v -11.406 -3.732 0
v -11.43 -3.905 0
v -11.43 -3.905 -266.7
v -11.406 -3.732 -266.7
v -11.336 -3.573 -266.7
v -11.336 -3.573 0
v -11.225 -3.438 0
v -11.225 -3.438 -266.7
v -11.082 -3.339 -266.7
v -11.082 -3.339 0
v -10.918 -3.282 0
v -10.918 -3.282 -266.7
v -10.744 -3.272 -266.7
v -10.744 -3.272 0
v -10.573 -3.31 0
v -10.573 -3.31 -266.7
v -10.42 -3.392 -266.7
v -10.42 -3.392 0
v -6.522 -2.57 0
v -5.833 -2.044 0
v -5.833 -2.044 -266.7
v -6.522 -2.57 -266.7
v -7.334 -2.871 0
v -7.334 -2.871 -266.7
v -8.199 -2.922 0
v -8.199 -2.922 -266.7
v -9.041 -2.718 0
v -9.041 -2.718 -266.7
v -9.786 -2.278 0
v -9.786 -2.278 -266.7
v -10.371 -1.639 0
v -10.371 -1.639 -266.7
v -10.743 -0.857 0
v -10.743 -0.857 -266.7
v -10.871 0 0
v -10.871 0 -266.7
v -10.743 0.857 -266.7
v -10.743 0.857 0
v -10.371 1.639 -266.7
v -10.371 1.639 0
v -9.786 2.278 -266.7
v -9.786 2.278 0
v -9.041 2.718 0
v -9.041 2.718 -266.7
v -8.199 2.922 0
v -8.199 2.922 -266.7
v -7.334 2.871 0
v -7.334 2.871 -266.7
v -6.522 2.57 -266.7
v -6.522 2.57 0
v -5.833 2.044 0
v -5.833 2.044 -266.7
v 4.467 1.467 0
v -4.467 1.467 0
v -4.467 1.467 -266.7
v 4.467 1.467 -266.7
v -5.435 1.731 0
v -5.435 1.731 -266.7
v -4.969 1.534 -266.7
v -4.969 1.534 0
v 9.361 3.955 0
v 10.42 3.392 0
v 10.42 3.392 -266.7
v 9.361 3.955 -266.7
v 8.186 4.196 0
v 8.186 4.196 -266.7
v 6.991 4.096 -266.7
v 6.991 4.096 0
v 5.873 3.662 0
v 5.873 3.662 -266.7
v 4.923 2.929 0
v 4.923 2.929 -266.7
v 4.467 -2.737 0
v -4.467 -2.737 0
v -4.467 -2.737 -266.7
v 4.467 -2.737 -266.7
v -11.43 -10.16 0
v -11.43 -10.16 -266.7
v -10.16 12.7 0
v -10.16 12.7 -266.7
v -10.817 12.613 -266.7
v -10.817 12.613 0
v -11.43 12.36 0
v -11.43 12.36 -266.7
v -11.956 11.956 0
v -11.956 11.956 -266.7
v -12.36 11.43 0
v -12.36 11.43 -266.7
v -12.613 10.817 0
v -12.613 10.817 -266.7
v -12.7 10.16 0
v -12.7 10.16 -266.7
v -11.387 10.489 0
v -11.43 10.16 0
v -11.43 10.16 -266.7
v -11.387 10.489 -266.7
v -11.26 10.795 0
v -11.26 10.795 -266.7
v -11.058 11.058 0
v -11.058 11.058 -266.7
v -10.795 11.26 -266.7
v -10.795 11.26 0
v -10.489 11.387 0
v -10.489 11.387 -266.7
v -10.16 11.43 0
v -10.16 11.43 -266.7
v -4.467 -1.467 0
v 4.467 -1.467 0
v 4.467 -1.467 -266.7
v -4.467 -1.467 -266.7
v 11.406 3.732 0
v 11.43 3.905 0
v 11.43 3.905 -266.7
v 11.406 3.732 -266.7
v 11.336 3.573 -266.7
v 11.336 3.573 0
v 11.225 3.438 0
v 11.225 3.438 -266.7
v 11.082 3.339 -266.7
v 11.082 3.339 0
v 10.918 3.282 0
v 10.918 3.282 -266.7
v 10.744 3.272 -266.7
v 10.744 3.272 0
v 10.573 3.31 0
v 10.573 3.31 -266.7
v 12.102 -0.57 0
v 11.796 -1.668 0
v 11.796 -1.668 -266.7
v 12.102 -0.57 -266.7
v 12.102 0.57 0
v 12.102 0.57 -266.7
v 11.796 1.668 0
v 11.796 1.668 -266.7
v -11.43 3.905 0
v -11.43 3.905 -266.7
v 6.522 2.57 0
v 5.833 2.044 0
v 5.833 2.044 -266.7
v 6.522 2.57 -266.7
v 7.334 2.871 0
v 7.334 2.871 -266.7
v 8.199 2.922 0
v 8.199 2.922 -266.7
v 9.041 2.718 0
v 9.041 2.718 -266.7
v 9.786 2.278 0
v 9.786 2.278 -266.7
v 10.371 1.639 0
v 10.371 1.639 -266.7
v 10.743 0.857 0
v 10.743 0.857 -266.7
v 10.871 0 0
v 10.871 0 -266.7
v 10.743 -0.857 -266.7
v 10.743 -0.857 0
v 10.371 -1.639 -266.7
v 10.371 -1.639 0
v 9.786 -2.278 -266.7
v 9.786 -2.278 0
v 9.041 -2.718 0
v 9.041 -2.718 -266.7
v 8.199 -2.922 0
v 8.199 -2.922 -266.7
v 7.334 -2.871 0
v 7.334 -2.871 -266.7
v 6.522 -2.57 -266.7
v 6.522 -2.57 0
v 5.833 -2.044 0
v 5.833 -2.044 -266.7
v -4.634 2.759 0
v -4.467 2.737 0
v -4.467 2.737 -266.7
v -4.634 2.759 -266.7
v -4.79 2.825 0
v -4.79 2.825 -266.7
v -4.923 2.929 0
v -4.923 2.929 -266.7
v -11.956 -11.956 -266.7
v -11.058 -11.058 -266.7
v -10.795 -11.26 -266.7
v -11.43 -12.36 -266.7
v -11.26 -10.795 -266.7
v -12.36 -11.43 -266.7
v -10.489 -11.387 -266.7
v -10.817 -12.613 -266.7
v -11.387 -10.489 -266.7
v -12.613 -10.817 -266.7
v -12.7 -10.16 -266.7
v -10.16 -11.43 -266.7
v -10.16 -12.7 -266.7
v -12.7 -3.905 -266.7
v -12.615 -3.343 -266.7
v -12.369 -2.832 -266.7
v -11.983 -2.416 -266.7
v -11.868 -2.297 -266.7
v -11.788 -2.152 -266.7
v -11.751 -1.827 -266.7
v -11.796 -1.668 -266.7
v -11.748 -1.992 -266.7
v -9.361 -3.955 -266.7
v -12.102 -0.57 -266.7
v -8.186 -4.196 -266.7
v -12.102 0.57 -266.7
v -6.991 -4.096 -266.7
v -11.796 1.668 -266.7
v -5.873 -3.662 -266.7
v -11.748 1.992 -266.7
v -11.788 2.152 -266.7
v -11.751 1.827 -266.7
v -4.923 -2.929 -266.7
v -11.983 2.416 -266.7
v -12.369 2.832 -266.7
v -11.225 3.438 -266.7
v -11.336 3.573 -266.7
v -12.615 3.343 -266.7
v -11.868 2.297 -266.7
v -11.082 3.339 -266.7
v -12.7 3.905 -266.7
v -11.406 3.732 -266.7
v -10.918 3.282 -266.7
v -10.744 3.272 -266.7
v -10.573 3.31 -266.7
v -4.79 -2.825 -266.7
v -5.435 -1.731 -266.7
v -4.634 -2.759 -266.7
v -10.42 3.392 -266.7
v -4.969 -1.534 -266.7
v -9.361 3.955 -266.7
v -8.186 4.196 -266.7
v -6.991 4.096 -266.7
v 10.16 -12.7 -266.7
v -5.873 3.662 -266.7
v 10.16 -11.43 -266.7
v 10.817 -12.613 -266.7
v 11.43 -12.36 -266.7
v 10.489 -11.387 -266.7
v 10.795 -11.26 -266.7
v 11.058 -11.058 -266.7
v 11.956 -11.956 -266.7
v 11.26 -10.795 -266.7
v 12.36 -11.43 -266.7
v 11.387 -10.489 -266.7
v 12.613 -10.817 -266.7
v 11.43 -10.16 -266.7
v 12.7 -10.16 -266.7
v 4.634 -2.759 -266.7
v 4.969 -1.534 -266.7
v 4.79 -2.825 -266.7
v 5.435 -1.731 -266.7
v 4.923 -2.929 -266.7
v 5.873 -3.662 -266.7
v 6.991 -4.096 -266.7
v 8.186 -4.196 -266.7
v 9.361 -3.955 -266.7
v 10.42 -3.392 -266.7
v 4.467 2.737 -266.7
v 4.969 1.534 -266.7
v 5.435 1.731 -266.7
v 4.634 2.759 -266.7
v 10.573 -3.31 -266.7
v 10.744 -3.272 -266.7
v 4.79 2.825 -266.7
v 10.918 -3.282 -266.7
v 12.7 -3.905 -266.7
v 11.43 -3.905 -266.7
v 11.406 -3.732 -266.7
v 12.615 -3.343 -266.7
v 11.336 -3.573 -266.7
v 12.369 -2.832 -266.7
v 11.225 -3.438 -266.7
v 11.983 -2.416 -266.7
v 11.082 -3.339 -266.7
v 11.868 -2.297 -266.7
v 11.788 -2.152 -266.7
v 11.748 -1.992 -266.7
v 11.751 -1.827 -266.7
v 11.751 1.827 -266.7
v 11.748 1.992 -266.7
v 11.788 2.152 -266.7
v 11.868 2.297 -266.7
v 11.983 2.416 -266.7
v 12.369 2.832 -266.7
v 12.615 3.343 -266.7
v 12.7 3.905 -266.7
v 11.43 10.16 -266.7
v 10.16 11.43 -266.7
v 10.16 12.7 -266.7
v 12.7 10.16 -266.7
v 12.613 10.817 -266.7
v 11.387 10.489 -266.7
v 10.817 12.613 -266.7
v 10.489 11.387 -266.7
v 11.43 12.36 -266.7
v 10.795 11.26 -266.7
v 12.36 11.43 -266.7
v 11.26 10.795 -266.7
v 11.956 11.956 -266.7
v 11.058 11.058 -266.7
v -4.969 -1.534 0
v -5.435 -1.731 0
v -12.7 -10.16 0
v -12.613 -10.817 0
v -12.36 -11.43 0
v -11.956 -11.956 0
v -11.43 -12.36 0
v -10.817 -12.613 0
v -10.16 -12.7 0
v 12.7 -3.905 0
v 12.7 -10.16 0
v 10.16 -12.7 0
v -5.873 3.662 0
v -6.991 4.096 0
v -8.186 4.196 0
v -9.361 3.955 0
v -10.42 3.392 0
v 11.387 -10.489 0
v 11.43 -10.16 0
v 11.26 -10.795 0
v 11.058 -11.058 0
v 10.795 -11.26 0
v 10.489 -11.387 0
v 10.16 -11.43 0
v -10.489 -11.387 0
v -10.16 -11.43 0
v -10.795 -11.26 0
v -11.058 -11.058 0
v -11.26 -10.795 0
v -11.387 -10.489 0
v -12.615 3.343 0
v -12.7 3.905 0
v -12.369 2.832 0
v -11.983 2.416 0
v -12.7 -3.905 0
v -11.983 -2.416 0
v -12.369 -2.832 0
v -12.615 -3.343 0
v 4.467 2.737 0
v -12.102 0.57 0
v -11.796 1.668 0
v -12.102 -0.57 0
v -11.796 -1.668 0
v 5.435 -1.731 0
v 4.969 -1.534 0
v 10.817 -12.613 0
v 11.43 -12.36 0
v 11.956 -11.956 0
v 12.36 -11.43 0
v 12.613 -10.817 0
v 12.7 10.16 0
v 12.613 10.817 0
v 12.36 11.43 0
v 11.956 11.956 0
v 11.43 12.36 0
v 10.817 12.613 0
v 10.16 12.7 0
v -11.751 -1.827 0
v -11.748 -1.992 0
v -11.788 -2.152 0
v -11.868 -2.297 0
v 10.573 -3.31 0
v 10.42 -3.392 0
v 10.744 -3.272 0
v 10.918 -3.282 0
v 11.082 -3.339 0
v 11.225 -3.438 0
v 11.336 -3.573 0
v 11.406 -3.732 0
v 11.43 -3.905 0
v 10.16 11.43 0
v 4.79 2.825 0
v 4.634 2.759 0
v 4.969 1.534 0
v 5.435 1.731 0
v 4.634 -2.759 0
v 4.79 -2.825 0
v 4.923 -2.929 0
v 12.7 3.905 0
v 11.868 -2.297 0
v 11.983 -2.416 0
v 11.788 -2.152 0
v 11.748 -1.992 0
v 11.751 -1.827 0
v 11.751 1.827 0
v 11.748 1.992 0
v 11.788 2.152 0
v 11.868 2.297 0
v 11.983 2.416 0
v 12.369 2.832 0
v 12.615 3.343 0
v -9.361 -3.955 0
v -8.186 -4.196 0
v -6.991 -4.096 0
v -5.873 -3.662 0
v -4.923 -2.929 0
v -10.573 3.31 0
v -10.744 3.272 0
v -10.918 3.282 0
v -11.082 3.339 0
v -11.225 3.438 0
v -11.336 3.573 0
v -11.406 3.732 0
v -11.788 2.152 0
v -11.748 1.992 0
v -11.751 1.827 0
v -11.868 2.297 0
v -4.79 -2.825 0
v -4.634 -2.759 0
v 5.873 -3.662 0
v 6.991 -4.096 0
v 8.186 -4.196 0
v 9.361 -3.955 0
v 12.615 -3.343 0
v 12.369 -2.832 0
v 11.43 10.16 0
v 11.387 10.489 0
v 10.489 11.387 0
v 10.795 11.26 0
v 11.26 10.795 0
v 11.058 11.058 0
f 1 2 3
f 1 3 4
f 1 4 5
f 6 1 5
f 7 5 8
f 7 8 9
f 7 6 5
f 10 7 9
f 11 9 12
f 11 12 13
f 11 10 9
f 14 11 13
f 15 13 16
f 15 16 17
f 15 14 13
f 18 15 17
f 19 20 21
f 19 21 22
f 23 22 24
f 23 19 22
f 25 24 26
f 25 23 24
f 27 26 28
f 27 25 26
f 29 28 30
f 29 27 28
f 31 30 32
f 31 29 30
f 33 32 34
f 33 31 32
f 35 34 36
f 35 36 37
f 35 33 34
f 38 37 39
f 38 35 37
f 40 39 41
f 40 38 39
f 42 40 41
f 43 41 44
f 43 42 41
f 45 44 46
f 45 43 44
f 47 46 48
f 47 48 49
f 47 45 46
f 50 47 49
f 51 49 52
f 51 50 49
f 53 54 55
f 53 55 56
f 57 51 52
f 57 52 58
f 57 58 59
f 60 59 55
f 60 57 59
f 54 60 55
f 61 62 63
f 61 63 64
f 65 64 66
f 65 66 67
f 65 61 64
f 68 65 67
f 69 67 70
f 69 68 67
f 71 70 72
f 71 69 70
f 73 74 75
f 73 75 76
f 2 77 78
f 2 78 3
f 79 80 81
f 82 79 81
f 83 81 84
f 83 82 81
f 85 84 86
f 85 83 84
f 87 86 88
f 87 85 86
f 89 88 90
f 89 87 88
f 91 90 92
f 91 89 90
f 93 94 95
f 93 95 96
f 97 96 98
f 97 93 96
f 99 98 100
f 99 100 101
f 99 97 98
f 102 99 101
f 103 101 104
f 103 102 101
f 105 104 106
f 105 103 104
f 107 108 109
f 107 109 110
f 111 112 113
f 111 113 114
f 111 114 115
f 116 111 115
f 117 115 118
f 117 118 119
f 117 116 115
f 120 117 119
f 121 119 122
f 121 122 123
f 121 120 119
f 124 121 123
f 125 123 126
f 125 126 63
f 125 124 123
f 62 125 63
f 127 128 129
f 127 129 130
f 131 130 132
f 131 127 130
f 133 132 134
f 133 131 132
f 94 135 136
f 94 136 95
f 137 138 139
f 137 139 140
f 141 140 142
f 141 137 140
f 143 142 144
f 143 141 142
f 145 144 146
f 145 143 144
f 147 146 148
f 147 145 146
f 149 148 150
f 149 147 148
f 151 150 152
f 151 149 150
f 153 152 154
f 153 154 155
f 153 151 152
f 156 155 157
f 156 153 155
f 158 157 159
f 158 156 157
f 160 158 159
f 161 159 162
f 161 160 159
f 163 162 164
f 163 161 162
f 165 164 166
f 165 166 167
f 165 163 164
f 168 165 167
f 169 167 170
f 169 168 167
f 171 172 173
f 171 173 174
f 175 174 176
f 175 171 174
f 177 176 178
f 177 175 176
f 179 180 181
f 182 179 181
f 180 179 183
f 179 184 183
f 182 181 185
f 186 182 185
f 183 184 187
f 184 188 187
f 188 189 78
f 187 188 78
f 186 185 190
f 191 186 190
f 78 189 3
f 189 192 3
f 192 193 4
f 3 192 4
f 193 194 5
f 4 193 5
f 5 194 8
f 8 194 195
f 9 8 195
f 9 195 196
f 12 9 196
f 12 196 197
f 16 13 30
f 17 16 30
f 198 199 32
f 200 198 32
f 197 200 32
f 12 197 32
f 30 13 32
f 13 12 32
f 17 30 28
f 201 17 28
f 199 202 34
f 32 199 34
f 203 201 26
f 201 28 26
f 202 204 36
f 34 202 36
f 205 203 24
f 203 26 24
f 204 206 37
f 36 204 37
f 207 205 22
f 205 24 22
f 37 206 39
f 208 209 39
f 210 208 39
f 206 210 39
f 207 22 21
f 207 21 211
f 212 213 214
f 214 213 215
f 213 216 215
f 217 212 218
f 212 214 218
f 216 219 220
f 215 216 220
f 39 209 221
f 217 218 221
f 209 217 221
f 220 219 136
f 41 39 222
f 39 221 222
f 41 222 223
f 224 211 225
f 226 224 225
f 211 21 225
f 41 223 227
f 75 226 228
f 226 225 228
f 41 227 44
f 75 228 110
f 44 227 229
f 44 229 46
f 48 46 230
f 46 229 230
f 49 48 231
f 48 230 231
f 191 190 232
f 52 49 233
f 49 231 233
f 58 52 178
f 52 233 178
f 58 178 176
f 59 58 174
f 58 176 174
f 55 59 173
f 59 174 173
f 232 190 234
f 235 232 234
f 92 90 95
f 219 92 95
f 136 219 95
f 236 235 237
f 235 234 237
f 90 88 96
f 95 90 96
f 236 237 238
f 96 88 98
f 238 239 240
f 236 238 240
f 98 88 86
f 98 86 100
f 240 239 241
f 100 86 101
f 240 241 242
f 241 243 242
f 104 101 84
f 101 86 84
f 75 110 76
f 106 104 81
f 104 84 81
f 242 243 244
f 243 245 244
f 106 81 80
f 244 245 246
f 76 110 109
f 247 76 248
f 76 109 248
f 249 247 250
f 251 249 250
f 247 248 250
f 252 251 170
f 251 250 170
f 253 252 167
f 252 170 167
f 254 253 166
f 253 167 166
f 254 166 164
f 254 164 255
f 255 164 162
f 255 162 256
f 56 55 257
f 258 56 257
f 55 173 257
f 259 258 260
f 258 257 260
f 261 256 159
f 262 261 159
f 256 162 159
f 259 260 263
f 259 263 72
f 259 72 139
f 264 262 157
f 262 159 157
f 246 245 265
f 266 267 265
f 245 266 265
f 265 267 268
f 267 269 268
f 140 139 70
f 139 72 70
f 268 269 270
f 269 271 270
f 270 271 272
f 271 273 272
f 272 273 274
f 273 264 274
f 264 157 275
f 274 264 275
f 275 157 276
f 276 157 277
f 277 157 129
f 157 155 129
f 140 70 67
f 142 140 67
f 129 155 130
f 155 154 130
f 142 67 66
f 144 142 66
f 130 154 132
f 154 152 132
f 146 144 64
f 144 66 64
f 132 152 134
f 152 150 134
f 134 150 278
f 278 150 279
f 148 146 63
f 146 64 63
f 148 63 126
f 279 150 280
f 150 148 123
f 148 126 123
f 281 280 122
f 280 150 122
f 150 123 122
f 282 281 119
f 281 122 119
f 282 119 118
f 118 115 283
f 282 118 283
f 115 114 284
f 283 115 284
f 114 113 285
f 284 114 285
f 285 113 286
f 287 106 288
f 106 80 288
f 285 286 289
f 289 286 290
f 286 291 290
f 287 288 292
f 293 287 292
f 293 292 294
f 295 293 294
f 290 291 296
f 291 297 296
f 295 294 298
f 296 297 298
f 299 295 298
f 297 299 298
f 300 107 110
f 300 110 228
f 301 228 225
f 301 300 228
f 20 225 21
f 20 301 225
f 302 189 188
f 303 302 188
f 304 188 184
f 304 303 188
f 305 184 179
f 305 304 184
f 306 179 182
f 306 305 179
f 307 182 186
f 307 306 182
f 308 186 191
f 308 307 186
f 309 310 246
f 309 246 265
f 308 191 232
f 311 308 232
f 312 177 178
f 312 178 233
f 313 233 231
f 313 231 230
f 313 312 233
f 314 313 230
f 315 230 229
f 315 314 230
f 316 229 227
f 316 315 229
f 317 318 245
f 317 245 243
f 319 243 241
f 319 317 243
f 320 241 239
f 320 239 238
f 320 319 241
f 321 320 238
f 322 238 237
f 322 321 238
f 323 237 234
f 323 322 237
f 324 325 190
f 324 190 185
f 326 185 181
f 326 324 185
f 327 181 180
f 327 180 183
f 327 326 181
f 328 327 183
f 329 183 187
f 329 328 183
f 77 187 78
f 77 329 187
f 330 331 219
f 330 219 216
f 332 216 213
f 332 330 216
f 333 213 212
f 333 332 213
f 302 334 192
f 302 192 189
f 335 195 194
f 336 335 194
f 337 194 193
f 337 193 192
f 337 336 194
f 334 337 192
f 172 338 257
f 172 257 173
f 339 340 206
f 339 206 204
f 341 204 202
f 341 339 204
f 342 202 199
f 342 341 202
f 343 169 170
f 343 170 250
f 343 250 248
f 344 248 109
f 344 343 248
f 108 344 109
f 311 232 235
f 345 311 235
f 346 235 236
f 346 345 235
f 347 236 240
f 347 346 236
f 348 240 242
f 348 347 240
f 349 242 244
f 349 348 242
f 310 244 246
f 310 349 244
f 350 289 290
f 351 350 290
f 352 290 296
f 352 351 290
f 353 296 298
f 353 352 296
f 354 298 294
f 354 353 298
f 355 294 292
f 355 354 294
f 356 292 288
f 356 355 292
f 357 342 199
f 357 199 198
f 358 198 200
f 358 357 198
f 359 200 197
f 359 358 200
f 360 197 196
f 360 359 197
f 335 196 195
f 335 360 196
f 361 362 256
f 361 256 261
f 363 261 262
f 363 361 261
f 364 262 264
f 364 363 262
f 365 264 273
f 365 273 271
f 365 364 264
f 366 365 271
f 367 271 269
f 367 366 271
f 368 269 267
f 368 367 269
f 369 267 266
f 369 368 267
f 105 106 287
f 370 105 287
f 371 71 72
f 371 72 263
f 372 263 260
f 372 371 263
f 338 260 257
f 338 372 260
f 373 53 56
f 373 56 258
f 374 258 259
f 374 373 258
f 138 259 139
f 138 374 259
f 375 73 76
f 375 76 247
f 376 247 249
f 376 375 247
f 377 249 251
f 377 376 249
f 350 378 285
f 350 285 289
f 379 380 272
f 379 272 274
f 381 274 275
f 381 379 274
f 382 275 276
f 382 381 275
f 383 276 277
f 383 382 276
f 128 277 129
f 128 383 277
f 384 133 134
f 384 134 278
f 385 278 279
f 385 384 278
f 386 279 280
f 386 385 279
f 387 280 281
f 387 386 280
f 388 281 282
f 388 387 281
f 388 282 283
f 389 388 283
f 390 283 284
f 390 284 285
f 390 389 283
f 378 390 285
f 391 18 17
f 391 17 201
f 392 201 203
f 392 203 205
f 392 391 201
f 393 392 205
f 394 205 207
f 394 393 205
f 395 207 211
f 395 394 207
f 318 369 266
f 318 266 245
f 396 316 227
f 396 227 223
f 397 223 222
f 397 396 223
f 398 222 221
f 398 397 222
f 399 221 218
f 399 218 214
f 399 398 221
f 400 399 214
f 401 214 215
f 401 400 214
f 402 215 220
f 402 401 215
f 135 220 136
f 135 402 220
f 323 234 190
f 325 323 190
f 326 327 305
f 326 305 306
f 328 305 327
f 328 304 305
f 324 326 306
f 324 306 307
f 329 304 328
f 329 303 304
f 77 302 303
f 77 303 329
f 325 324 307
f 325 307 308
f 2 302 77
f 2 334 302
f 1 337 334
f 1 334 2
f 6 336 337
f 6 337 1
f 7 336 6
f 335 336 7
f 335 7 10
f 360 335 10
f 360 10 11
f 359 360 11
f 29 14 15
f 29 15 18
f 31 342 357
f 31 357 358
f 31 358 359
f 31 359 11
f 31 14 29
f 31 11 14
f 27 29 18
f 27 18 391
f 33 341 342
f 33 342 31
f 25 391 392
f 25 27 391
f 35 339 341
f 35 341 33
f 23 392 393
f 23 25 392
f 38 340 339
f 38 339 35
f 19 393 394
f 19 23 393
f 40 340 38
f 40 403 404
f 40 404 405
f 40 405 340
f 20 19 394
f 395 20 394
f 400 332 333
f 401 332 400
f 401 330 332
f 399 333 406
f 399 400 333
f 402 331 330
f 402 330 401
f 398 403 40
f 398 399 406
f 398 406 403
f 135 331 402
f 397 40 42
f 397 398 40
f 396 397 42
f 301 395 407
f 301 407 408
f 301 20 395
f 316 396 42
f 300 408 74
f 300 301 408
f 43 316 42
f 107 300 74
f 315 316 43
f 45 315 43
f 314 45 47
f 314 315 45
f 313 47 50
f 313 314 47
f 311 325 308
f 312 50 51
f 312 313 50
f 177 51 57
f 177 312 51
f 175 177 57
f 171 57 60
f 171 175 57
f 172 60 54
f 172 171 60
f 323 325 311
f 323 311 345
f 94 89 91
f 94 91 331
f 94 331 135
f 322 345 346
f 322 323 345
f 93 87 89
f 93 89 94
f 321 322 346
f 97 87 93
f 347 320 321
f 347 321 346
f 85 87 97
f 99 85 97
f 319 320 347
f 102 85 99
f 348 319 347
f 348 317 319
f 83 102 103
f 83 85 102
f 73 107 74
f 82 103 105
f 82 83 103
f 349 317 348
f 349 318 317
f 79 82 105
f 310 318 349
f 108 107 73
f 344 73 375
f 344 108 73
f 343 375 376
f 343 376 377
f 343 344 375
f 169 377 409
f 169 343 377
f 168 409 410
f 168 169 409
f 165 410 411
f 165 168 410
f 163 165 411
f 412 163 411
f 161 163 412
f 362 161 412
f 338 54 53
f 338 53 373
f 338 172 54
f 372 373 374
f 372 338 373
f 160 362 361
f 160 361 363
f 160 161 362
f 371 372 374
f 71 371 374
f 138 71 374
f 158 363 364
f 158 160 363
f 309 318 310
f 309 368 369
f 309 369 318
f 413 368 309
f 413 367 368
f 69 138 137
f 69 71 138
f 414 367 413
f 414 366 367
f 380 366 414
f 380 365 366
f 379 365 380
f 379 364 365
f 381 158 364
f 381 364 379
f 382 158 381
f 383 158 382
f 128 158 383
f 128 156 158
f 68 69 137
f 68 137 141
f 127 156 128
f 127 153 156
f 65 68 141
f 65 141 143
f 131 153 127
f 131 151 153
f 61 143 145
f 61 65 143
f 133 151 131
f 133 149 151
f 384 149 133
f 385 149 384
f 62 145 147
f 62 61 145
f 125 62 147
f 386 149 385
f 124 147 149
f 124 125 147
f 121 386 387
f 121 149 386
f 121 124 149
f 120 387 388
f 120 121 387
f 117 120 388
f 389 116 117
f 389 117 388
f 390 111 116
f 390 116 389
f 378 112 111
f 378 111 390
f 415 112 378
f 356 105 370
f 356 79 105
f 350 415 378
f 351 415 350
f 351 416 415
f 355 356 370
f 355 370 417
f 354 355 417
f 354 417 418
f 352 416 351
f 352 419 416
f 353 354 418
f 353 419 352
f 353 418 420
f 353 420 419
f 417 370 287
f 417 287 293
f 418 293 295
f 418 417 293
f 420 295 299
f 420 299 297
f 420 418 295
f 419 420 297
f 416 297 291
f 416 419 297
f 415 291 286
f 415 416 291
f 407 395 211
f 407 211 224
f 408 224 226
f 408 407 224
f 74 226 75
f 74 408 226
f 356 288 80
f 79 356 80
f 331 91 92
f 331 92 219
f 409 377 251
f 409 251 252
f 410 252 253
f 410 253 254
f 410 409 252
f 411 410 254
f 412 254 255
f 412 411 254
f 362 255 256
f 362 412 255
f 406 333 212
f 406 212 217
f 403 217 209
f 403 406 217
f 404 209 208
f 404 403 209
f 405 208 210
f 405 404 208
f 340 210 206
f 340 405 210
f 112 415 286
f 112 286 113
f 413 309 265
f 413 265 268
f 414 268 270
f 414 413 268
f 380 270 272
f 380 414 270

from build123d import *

# Parameters (mm, degrees)
BOSS_EXTRUDE1_DEPTH = 266.7


with BuildPart() as part:
    # Sketch1 → Boss-Extrude1 (new body)
    with BuildSketch(Plane.XY):
        with BuildLine():
            Line((12.7, 3.904831807), (12.7, 10.16))
            ThreePointArc((12.7, 10.16), (11.956051224, 11.956051224), (10.16, 12.7))
            Line((10.16, 12.7), (-10.16, 12.7))
            ThreePointArc((-10.16, 12.7), (-11.956051224, 11.956051224), (-12.7, 10.16))
            Line((-12.7, 10.16), (-12.7, 3.904831807))
            ThreePointArc((-12.7, 3.904831807), (-12.511460601, 3.078521934), (-11.983162199, 2.415773182))
            ThreePointArc((-11.983162199, 2.415773182), (-11.763134535, 2.073265365), (-11.796313868, 1.667527878))
            ThreePointArc((-11.796313868, 1.667527878), (-12.1412, 0), (-11.796313868, -1.667527878))
            ThreePointArc((-11.796313868, -1.667527878), (-11.763134535, -2.073265365), (-11.983162199, -2.415773182))
            ThreePointArc((-11.983162199, -2.415773182), (-12.511460601, -3.078521934), (-12.7, -3.904831807))
            Line((-12.7, -3.904831807), (-12.7, -10.16))
            ThreePointArc((-12.7, -10.16), (-11.956051224, -11.956051224), (-10.16, -12.7))
            Line((-10.16, -12.7), (10.16, -12.7))
            ThreePointArc((10.16, -12.7), (11.956051224, -11.956051224), (12.7, -10.16))
            Line((12.7, -10.16), (12.7, -3.904831807))
            ThreePointArc((12.7, -3.904831807), (12.511460601, -3.078521934), (11.983162199, -2.415773182))
            ThreePointArc((11.983162199, -2.415773182), (11.763134535, -2.073265365), (11.796313868, -1.667527878))
            ThreePointArc((11.796313868, -1.667527878), (12.1412, 0), (11.796313868, 1.667527878))
            ThreePointArc((11.796313868, 1.667527878), (11.763134535, 2.073265365), (11.983162199, 2.415773182))
            ThreePointArc((11.983162199, 2.415773182), (12.511460601, 3.078521934), (12.7, 3.904831807))
        make_face()
        with BuildLine():
            Line((4.467104451, -1.46685), (-4.467104451, -1.46685))
            ThreePointArc((-4.467104451, -1.46685), (-5.208770649, -1.617154514), (-5.833401911, -2.04435))
            ThreePointArc((-5.833401911, -2.04435), (-10.8712, 0), (-5.833401911, 2.04435))
            ThreePointArc((-5.833401911, 2.04435), (-5.208770649, 1.617154514), (-4.467104451, 1.46685))
            Line((-4.467104451, 1.46685), (4.467104451, 1.46685))
            ThreePointArc((4.467104451, 1.46685), (5.208770649, 1.617154514), (5.833401911, 2.04435))
            ThreePointArc((5.833401911, 2.04435), (10.8712, 0), (5.833401911, -2.04435))
            ThreePointArc((5.833401911, -2.04435), (5.208770649, -1.617154514), (4.467104451, -1.46685))
        make_face(mode=Mode.SUBTRACT)
        with BuildLine():
            Line((11.43, 10.16), (11.43, 3.904831807))
            ThreePointArc((11.43, 3.904831807), (11.082315158, 3.338550075), (10.42, 3.392386688))
            ThreePointArc((10.42, 3.392386688), (7.584682807, 4.188867833), (4.922536938, 2.92935))
            ThreePointArc((4.922536938, 2.92935), (4.714326517, 2.786951505), (4.467104451, 2.73685))
            Line((4.467104451, 2.73685), (-4.467104451, 2.73685))
            ThreePointArc((-4.467104451, 2.73685), (-4.714326517, 2.786951505), (-4.922536938, 2.92935))
            ThreePointArc((-4.922536938, 2.92935), (-7.584682807, 4.188867833), (-10.42, 3.392386688))
            ThreePointArc((-10.42, 3.392386688), (-11.082315158, 3.338550075), (-11.43, 3.904831807))
            Line((-11.43, 3.904831807), (-11.43, 10.16))
            ThreePointArc((-11.43, 10.16), (-11.058025612, 11.058025612), (-10.16, 11.43))
            Line((-10.16, 11.43), (10.16, 11.43))
            ThreePointArc((10.16, 11.43), (11.058025612, 11.058025612), (11.43, 10.16))
        make_face(mode=Mode.SUBTRACT)
        with BuildLine():
            Line((11.43, -3.904831807), (11.43, -10.16))
            ThreePointArc((11.43, -10.16), (11.058025612, -11.058025612), (10.16, -11.43))
            Line((10.16, -11.43), (-10.16, -11.43))
            ThreePointArc((-10.16, -11.43), (-11.058025612, -11.058025612), (-11.43, -10.16))
            Line((-11.43, -10.16), (-11.43, -3.904831807))
            ThreePointArc((-11.43, -3.904831807), (-11.082315158, -3.338550075), (-10.42, -3.392386688))
            ThreePointArc((-10.42, -3.392386688), (-7.584682807, -4.188867833), (-4.922536938, -2.92935))
            ThreePointArc((-4.922536938, -2.92935), (-4.714326517, -2.786951505), (-4.467104451, -2.73685))
            Line((-4.467104451, -2.73685), (4.467104451, -2.73685))
            ThreePointArc((4.467104451, -2.73685), (4.714326517, -2.786951505), (4.922536938, -2.92935))
            ThreePointArc((4.922536938, -2.92935), (7.584682807, -4.188867833), (10.42, -3.392386688))
            ThreePointArc((10.42, -3.392386688), (11.082315158, -3.338550075), (11.43, -3.904831807))
        make_face(mode=Mode.SUBTRACT)
    extrude(amount=-BOSS_EXTRUDE1_DEPTH)


solid = part.part
